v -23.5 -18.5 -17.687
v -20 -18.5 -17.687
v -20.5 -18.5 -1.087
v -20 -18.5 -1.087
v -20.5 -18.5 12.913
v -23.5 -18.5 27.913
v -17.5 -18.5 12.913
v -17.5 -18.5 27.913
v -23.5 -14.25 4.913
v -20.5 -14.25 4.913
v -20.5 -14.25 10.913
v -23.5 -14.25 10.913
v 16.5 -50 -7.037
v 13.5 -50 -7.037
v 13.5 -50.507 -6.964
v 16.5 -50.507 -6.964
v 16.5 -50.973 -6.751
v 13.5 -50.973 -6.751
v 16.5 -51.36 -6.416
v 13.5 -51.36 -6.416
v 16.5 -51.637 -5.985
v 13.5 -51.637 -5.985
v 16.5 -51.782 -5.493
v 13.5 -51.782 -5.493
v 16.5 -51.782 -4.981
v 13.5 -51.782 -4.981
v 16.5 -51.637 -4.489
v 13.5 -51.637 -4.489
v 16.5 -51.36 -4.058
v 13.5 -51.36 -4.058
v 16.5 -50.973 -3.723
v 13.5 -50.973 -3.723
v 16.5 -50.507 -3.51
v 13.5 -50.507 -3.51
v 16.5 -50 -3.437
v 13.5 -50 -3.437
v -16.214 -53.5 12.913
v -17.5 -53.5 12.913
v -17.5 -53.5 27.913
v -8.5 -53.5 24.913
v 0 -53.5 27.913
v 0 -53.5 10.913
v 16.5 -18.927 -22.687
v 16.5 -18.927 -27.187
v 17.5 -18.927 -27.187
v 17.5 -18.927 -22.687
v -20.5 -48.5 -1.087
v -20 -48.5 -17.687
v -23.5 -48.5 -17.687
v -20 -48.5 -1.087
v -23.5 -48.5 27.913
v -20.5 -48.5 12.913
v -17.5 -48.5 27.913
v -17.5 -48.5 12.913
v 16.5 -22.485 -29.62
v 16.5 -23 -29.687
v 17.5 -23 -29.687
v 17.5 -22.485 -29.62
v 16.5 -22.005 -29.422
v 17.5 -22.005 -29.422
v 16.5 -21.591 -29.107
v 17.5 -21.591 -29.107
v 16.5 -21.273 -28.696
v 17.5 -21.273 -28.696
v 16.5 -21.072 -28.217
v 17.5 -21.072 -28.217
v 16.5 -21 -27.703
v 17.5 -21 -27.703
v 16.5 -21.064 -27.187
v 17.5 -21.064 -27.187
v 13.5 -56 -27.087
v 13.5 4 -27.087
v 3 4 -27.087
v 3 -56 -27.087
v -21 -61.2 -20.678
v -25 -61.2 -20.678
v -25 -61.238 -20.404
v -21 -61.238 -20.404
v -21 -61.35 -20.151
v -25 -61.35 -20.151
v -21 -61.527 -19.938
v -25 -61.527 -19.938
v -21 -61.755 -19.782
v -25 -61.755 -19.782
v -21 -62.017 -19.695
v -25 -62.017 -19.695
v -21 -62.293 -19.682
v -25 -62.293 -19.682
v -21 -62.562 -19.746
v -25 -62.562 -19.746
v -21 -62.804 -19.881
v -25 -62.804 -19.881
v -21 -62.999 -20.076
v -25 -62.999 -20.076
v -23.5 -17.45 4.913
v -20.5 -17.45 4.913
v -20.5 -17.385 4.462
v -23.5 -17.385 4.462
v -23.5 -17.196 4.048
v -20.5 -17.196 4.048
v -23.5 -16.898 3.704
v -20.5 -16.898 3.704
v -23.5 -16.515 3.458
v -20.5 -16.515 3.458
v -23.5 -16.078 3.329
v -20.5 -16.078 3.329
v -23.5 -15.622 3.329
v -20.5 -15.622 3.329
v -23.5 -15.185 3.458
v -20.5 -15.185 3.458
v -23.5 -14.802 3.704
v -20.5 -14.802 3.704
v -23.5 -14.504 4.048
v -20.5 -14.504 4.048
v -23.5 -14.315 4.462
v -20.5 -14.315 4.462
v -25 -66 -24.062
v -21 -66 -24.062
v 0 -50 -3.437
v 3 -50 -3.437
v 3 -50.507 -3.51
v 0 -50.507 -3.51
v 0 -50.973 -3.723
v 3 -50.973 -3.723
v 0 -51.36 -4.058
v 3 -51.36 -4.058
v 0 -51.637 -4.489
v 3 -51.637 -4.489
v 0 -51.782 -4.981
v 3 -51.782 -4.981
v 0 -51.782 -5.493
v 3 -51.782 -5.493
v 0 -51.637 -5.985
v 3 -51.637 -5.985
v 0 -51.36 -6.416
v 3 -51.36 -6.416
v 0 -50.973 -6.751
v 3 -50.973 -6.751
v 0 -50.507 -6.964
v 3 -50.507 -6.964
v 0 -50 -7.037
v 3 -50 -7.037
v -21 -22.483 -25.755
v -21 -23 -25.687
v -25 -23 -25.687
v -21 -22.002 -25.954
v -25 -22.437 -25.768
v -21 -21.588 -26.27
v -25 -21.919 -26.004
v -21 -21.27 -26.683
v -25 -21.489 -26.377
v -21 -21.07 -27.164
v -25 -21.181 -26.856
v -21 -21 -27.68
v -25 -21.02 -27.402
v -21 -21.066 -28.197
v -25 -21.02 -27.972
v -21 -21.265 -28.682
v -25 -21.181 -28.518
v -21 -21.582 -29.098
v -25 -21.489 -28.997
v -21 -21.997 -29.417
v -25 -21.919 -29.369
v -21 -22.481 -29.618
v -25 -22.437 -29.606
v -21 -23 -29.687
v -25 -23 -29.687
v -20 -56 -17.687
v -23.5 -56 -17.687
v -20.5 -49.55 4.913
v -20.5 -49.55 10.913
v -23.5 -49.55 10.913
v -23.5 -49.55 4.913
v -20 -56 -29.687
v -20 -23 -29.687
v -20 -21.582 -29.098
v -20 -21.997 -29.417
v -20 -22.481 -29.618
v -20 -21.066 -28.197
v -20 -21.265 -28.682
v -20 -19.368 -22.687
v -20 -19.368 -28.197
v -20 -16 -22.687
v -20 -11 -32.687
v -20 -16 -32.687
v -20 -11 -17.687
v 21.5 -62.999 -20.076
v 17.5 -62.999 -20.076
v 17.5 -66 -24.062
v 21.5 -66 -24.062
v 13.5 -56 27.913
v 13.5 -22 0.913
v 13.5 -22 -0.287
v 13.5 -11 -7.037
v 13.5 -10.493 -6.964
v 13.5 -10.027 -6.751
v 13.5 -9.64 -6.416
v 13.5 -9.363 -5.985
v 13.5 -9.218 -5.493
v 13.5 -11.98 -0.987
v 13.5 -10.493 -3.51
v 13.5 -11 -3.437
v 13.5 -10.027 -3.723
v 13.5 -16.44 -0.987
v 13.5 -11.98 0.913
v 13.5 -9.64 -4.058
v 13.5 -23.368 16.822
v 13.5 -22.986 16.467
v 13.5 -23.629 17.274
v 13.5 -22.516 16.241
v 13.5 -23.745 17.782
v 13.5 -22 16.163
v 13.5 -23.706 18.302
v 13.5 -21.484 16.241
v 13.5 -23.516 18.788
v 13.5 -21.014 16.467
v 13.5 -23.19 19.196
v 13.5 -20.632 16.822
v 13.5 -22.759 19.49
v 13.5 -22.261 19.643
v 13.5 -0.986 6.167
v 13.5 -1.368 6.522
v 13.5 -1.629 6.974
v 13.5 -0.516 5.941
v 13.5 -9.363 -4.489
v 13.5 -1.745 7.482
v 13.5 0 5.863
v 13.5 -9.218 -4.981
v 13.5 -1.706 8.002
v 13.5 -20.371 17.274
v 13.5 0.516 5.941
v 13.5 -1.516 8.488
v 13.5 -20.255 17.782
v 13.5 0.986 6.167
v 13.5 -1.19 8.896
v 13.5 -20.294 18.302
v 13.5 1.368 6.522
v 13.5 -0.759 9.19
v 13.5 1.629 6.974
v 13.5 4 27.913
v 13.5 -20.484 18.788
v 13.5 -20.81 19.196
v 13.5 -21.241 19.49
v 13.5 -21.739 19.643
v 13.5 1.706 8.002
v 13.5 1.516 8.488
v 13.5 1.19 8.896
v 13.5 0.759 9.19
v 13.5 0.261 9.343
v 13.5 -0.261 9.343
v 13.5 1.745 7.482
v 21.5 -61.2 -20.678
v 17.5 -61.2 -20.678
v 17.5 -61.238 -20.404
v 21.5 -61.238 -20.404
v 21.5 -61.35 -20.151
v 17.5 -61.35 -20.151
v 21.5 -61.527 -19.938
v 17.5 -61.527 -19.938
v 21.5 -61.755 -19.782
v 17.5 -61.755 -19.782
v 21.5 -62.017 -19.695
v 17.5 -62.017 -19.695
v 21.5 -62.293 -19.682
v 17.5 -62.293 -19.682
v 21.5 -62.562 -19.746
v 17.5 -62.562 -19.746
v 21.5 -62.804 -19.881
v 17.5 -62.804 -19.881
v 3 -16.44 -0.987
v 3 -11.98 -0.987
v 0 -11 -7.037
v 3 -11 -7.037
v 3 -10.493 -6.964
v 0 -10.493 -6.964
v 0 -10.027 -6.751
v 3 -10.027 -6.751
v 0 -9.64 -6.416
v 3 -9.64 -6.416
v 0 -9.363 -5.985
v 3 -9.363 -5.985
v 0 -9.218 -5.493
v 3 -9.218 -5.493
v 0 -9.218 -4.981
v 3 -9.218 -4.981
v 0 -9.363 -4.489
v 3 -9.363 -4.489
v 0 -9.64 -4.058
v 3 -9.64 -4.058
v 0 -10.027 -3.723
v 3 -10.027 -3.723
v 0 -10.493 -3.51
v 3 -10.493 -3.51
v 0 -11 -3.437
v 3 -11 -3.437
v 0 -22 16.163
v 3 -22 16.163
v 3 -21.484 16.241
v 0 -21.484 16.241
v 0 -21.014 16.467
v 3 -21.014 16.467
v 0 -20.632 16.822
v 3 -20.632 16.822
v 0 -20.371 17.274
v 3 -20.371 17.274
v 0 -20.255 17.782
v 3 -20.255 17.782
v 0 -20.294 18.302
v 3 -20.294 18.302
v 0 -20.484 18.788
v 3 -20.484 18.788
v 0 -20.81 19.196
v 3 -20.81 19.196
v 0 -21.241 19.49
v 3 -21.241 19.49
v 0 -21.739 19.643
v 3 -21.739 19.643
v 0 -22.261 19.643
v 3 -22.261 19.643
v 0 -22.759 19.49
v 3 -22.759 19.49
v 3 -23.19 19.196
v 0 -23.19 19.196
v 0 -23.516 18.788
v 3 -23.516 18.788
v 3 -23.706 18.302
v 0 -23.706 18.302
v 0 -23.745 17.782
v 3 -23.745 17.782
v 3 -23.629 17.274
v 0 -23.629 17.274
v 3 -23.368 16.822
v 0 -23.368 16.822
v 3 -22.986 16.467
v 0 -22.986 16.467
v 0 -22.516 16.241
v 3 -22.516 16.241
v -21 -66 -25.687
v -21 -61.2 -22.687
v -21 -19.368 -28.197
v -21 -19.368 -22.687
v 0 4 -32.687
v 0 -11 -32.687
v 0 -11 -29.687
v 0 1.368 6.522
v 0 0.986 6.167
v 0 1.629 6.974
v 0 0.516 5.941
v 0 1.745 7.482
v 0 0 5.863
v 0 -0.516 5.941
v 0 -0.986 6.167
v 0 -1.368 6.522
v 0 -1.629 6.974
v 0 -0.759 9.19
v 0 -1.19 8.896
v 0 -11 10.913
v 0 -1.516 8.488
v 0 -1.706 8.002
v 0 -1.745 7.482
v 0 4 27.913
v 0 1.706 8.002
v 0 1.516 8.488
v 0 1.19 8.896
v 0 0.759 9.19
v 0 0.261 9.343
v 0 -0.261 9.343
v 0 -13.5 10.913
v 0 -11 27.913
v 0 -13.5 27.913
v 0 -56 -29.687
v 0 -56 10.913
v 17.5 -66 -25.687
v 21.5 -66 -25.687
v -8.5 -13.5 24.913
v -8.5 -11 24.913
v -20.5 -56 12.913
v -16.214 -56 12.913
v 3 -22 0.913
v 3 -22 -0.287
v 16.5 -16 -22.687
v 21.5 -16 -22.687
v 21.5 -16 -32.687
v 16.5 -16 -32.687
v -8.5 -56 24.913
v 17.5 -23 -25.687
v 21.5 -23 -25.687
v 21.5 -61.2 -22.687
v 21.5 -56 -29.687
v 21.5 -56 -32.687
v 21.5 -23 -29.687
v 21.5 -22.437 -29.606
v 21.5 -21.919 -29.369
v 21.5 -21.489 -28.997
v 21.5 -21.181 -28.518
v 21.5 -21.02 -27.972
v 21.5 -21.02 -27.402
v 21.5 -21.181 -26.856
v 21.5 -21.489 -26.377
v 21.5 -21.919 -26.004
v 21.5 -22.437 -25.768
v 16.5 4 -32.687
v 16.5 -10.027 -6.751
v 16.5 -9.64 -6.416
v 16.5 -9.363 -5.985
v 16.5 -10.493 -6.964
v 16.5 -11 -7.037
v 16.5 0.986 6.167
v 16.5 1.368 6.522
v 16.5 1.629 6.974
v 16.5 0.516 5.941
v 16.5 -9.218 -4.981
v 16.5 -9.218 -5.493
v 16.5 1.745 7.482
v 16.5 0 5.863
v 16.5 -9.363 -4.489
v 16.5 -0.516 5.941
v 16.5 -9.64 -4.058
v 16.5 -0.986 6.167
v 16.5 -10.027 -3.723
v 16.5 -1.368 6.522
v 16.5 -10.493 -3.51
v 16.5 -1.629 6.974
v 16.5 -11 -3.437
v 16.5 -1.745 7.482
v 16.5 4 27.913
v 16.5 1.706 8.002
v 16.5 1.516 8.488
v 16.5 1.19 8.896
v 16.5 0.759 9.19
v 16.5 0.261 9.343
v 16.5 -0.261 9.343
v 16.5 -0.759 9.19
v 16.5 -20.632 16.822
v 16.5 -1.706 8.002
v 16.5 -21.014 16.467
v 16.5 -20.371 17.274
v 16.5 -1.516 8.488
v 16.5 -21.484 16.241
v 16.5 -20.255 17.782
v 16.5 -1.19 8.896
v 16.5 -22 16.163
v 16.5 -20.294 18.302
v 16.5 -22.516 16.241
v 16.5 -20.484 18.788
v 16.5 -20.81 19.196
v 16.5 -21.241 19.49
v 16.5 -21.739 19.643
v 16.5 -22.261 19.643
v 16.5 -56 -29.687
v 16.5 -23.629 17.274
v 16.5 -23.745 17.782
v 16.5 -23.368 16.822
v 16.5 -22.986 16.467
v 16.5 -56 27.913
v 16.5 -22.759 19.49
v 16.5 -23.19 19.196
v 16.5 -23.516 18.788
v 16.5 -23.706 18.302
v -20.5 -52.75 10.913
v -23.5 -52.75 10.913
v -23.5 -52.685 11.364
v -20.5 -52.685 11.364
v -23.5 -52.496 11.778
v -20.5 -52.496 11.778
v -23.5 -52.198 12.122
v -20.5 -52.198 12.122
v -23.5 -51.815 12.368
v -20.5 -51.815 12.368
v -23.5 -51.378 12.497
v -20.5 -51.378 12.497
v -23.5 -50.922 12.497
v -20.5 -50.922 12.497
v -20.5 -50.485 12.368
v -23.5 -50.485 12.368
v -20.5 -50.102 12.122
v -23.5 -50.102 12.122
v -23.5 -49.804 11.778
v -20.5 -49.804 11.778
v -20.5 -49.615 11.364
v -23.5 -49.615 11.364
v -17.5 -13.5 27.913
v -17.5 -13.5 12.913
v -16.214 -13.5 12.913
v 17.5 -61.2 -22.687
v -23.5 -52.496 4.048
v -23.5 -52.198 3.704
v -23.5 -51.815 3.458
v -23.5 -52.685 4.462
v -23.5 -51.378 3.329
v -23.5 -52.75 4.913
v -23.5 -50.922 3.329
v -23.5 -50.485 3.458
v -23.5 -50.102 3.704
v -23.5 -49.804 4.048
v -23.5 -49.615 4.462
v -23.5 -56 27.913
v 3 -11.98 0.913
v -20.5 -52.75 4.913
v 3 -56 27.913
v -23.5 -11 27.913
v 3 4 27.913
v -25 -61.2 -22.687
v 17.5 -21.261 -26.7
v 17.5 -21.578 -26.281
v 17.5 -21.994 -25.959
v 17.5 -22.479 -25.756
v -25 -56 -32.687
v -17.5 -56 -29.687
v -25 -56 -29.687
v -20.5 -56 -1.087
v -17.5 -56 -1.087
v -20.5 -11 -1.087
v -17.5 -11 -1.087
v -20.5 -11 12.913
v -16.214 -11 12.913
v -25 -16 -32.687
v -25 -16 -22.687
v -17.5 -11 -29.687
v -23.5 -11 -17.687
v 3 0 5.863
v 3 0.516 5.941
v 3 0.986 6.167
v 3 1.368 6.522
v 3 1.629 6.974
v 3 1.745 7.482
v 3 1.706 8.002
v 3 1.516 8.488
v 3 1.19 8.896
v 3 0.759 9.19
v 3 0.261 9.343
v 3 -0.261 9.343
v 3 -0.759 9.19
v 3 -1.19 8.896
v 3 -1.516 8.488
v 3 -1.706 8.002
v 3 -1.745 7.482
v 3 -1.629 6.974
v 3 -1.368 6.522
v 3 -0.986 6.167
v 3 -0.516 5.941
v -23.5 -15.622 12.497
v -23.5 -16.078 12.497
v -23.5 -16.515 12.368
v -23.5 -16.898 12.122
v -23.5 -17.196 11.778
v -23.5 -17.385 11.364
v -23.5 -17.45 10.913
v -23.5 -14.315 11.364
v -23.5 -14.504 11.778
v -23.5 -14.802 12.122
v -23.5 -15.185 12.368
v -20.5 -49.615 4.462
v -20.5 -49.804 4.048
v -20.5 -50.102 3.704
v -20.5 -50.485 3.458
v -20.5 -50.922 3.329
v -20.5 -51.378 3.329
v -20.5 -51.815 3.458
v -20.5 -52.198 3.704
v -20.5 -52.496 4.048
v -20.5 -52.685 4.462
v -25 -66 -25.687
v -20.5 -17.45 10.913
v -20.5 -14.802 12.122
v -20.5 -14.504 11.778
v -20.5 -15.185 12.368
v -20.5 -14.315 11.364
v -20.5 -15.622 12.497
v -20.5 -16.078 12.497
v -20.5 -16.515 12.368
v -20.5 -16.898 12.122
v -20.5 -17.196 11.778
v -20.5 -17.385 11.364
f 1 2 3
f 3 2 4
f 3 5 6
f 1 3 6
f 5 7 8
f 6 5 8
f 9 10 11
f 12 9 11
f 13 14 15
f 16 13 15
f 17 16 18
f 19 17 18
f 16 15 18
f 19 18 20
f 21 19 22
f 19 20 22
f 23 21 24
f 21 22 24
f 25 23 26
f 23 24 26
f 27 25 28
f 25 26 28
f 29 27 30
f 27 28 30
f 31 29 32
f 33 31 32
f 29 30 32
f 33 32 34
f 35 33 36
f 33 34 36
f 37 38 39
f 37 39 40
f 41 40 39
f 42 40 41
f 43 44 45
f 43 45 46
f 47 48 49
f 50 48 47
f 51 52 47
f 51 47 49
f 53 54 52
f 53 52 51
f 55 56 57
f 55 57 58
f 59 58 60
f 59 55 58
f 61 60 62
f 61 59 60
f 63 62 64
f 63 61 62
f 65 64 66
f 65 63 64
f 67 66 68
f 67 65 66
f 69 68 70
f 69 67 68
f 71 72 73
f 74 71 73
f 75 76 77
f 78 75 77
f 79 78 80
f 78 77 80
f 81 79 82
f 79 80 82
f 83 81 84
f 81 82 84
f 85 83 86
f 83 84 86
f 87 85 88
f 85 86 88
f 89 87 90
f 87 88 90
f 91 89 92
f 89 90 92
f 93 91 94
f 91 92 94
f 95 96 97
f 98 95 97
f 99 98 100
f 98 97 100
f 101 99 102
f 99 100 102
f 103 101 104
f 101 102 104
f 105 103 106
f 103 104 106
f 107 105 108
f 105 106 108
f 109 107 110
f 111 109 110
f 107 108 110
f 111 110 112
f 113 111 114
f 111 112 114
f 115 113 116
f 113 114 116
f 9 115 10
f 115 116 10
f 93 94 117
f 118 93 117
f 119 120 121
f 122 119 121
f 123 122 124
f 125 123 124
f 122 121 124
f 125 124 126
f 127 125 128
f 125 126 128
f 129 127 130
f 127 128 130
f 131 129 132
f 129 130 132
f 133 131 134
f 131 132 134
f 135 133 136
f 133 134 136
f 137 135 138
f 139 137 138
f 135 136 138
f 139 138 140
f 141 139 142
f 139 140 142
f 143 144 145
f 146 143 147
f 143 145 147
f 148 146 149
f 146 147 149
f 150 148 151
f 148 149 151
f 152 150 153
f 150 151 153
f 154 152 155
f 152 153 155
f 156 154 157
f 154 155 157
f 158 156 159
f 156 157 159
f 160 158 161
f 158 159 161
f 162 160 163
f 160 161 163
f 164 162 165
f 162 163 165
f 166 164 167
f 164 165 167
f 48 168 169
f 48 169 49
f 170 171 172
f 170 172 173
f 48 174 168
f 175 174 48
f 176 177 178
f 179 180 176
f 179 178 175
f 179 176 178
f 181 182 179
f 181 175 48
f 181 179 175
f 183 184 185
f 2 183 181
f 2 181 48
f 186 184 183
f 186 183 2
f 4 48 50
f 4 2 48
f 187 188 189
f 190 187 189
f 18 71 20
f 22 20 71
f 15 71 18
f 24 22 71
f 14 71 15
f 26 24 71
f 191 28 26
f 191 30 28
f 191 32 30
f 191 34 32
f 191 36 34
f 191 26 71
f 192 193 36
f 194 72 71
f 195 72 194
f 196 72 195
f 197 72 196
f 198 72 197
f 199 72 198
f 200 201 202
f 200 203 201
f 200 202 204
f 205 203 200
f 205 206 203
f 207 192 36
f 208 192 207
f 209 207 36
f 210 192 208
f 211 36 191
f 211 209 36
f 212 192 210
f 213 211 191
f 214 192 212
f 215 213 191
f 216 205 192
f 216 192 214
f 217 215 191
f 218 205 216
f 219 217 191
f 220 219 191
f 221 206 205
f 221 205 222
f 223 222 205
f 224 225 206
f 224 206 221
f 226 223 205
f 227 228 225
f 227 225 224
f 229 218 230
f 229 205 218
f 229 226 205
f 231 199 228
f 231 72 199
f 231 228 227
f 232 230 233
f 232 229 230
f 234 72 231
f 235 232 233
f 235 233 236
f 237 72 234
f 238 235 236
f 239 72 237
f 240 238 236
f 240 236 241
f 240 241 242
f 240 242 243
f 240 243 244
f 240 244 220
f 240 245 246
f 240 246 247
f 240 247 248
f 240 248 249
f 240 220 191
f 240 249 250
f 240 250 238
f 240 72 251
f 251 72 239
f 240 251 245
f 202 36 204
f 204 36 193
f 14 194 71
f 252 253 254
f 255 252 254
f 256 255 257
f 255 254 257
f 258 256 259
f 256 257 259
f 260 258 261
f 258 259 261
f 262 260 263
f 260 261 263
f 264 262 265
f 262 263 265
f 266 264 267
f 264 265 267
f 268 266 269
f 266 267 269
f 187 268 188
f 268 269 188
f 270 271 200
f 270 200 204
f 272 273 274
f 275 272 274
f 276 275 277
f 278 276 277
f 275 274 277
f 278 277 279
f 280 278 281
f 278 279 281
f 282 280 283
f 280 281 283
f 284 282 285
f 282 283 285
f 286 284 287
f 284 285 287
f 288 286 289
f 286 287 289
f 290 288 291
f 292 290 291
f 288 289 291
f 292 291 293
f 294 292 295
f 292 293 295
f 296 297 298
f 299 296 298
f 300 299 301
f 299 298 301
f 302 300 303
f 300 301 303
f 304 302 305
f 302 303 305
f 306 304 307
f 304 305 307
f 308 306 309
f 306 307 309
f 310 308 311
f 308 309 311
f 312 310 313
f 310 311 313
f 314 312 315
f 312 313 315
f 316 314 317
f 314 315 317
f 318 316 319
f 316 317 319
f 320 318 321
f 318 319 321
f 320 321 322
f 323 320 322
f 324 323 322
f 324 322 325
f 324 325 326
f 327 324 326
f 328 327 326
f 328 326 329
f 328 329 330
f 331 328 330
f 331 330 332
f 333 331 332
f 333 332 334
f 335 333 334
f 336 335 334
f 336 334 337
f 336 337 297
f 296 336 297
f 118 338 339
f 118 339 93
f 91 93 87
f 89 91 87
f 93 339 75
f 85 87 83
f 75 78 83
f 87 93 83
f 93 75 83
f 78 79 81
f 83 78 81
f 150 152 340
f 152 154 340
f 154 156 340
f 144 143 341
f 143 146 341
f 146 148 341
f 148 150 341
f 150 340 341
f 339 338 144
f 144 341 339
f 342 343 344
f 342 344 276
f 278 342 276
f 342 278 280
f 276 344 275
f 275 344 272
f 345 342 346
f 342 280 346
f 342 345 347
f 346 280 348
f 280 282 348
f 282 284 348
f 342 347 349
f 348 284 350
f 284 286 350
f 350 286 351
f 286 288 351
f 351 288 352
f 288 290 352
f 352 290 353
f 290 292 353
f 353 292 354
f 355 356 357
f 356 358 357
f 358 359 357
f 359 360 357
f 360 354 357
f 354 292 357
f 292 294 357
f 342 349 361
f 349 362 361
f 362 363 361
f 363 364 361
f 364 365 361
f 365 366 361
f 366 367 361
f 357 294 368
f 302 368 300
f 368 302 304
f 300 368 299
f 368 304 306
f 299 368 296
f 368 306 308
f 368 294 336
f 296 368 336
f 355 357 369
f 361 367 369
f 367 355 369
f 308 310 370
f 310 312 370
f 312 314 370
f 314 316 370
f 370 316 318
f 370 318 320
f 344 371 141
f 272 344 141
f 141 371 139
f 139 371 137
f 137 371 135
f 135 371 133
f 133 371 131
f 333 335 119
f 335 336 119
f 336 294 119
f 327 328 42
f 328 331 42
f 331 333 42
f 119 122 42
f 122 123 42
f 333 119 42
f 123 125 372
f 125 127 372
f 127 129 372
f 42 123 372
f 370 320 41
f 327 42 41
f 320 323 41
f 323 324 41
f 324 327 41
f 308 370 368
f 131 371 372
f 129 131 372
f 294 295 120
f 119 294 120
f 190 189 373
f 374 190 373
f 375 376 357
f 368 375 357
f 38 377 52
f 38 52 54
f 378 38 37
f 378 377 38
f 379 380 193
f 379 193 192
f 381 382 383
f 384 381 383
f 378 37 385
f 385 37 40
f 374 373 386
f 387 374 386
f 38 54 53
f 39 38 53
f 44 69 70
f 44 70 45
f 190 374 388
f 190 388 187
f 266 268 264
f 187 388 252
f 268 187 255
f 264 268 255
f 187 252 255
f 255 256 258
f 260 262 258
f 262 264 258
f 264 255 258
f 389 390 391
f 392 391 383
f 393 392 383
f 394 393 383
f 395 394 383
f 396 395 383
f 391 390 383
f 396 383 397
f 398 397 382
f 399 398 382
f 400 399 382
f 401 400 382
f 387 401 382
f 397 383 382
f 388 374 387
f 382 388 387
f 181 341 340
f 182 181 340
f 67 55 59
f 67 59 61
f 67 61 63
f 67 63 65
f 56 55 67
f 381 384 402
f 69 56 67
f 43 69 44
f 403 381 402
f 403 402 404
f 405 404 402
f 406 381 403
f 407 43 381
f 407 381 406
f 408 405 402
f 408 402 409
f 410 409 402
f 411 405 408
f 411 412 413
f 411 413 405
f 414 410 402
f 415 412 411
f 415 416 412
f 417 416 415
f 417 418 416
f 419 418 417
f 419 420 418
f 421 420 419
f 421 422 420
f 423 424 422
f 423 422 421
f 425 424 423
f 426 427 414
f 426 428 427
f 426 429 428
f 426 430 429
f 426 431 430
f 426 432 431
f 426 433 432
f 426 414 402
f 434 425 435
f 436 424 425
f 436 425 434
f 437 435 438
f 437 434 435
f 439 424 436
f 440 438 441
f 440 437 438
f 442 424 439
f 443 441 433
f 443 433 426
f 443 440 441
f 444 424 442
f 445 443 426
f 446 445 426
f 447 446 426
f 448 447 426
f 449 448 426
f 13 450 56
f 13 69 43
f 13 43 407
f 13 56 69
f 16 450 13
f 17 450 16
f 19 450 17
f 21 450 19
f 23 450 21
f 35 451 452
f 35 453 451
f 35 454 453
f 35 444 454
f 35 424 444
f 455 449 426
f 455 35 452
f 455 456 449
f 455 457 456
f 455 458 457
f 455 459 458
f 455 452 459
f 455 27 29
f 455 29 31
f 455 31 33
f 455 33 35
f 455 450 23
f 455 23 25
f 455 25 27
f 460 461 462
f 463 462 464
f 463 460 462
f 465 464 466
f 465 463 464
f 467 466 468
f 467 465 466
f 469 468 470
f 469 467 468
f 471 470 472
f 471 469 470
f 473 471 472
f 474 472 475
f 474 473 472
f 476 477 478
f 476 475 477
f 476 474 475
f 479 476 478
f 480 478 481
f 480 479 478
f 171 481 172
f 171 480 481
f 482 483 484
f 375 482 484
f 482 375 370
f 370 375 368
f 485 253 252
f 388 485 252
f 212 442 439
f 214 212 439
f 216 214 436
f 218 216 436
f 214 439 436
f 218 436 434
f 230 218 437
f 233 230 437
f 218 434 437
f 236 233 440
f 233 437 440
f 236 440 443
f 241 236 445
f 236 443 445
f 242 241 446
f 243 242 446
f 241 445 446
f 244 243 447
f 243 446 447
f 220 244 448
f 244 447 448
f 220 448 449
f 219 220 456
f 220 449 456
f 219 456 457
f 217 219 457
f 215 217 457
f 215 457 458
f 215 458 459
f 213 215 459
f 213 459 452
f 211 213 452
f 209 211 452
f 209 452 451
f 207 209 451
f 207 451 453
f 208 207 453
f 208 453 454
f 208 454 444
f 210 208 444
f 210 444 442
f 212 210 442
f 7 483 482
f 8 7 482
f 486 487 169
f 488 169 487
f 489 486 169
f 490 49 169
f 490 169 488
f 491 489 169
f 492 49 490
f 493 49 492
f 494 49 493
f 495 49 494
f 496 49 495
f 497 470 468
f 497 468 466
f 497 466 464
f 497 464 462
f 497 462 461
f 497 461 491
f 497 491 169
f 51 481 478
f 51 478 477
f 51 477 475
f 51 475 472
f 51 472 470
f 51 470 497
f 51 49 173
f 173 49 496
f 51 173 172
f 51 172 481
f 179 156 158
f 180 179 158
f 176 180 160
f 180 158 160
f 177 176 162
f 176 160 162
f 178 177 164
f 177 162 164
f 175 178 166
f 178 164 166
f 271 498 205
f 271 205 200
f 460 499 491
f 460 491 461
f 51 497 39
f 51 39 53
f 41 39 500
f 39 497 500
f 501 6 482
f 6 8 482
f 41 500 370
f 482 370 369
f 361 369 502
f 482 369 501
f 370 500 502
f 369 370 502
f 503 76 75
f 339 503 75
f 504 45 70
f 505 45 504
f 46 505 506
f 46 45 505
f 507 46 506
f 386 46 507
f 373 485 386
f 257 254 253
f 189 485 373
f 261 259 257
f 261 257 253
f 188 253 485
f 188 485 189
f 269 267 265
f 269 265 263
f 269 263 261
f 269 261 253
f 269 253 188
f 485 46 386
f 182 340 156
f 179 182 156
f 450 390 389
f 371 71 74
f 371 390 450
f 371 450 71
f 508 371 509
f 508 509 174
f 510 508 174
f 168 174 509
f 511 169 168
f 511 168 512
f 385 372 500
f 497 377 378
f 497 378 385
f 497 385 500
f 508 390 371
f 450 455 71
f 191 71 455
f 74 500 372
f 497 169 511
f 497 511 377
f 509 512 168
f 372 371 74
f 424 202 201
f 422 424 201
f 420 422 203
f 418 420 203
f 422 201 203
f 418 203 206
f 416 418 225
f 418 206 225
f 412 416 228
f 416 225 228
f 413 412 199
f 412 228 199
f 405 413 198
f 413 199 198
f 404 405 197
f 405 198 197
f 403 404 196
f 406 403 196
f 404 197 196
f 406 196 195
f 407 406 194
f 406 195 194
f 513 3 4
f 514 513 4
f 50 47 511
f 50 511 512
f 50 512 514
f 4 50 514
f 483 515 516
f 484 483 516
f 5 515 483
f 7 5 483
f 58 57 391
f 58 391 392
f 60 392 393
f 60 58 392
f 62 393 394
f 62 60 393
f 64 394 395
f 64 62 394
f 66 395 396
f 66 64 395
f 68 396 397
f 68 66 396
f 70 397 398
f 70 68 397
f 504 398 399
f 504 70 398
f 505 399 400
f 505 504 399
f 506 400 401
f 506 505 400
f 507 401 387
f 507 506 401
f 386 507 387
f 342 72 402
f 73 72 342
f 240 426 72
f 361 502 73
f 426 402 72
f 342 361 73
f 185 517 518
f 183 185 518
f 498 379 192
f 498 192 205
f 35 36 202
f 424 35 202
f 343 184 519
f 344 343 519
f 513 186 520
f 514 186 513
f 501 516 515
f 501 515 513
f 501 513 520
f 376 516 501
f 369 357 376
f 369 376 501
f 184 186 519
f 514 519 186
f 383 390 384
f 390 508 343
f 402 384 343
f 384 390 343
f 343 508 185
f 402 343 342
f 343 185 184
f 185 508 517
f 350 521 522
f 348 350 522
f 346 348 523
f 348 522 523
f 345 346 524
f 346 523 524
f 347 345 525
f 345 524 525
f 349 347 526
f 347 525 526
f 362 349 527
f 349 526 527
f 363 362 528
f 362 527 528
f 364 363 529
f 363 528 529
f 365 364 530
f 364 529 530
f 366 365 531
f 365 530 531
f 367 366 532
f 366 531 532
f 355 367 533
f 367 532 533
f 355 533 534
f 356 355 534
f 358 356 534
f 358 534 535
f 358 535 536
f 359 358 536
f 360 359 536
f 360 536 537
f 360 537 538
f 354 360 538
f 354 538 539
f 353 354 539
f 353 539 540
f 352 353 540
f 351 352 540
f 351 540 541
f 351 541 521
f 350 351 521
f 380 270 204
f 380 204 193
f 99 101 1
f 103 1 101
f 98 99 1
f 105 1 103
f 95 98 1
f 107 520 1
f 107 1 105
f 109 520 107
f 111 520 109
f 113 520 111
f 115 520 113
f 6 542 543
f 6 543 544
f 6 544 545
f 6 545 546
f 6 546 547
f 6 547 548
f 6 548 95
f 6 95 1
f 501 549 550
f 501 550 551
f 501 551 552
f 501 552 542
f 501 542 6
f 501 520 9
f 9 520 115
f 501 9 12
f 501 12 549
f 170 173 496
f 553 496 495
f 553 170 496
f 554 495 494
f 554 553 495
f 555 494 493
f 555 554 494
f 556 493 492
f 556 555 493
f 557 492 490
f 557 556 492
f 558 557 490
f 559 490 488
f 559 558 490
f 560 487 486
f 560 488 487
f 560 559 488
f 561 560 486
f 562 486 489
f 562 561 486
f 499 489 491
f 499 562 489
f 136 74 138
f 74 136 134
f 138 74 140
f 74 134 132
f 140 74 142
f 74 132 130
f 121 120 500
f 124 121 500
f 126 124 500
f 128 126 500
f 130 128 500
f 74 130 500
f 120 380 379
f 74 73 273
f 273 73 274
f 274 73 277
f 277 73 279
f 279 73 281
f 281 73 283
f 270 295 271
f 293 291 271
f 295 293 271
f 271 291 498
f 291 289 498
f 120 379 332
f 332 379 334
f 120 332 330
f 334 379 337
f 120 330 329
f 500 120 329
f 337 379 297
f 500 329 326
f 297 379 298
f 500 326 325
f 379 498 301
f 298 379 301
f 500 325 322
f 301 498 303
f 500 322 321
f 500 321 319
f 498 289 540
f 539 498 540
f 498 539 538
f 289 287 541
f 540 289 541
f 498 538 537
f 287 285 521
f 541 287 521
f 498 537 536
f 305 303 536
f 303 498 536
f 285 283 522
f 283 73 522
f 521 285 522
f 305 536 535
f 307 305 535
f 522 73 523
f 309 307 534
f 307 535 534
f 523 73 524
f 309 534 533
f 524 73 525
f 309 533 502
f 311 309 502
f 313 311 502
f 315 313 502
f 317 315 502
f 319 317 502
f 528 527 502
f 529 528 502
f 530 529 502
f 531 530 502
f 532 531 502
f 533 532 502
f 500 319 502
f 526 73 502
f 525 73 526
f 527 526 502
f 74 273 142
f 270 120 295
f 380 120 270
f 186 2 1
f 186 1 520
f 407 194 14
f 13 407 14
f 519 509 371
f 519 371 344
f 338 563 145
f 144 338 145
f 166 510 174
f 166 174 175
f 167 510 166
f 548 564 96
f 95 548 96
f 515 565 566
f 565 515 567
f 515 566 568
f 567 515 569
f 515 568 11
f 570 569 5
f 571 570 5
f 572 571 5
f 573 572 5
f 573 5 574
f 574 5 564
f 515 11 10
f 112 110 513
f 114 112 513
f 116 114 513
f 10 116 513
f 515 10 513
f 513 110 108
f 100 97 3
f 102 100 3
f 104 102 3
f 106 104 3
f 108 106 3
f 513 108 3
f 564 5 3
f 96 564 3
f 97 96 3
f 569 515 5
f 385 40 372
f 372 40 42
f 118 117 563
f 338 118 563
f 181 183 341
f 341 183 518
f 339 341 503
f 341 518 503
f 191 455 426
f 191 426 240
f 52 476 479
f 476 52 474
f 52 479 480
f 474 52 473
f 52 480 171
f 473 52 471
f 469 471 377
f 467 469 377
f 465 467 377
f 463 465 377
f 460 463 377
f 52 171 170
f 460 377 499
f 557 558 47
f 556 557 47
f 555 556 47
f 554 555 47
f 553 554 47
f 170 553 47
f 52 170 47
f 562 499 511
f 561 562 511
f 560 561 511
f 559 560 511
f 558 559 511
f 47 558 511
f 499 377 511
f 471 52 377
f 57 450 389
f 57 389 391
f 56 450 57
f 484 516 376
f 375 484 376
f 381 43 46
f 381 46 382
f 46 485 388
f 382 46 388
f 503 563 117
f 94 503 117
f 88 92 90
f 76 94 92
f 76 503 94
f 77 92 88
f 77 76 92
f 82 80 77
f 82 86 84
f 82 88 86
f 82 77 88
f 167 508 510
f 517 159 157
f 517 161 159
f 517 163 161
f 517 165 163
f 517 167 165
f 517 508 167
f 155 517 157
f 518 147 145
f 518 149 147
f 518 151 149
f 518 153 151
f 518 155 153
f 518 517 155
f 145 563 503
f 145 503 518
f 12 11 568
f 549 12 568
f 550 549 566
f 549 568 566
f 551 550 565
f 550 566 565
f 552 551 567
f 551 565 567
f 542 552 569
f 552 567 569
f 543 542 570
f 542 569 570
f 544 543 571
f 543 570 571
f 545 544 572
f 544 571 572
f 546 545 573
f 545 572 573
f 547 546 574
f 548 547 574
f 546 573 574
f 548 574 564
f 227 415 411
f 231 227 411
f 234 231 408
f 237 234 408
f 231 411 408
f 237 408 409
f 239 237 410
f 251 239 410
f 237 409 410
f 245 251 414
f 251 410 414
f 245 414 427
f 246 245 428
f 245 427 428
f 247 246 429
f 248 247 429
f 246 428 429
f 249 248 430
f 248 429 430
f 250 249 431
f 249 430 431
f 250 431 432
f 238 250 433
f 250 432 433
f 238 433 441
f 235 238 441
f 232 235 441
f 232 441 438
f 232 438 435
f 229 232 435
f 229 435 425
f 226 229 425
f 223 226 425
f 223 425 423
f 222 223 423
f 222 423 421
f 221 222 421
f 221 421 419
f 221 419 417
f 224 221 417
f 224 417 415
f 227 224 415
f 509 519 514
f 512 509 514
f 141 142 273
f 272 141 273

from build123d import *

# Parameters (mm, degrees)
CUT_EXTRUDE1_START             = -55
CUT_EXTRUDE1_DEPTH             = 50.2
CUT_EXTRUDE1_2_DEPTH           = 39
CUT_EXTRUDE1_START_2           = -16
CUT_EXTRUDE1_3_OUTLINE_W       = 21.5
CUT_EXTRUDE1_3_OUTLINE_H       = 4
CUT_EXTRUDE1_3_OUTLINE_W_2     = 7.5
CUT_EXTRUDE1_3_DEPTH           = 6
CUT_EXTRUDE1_START_3           = -10
CUT_EXTRUDE1_4_OUTLINE_W       = 17.5
CUT_EXTRUDE1_4_OUTLINE_H       = 3
CUT_EXTRUDE1_4_DEPTH           = 6.998889459
CUT_EXTRUDE1_START_4           = -32.686984715
CUT_EXTRUDE1_5_DEPTH           = 2.5
CUT_EXTRUDE1_START_5           = -25
CUT_EXTRUDE1_6_DEPTH           = 46.5
CUT_EXTRUDE2_DEPTH             = 5.2
CUT_EXTRUDE3_DEPTH             = 40
CUT_EXTRUDE4_DEPTH             = 38.5
CUT_EXTRUDE5_DEPTH             = 4
CUT_EXTRUDE6_DEPTH             = 4
CUT_EXTRUDE7_DEPTH             = 4
CUT_EXTRUDE8_START             = -4
CUT_EXTRUDE8_DEPTH             = 4
CUT_EXTRUDE9_START             = -1
CUT_EXTRUDE9_DEPTH             = 1
CUT_EXTRUDE10_DEPTH            = 1
SKETCH11_W                     = 16.5
SKETCH11_H                     = 60.6
BOSS_EXTRUDE1_DEPTH            = 15
SKETCH12_W                     = 29
SKETCH12_H                     = 30
CUT_EXTRUDE11_DEPTH            = 84.339300358
SKETCH13_W                     = 10.5
SKETCH13_H                     = 55
CUT_EXTRUDE12_DEPTH            = 82.199993727
CUT_EXTRUDE15_DEPTH            = 84.106491828
CUT_EXTRUDE16_REACH            = 80.794
BOSS_EXTRUDE2_DEPTH            = 10.5
F_3_5_3_5_DIAMETER_HOLE1_D     = 3.5
F_3_5_3_5_DIAMETER_HOLE1_DEPTH = 3
F_3_5_3_5_DIAMETER_HOLE2_D     = 3.5
F_3_5_3_5_DIAMETER_HOLE2_DEPTH = 8
SKETCH24_W                     = 46.5
SKETCH24_H                     = 16
CUT_EXTRUDE17_DEPTH            = 3
SKETCH25_W                     = 3
SKETCH25_H                     = 6
BOSS_EXTRUDE4_DEPTH            = 46.5
SKETCH27_W                     = 45.6
SKETCH27_H                     = 7.5
BOSS_EXTRUDE5_DEPTH            = 3.5
CUT_EXTRUDE18_START            = -45
SKETCH28_W                     = 4.285714286
SKETCH28_H                     = 14
CUT_EXTRUDE18_DEPTH            = 45


with BuildPart() as part:
    # Cut-Extrude1: read off the stored shape, not the designer's step
    # Cut-Extrude1 outline → Cut-Extrude1 (new body)
    with BuildSketch(Plane.XZ.offset(66).offset(CUT_EXTRUDE1_START)):
        Polygon((0, 10.913015285), (0, -25.686984715), (21.5, -25.686984715), (21.5, 27.913015285), (-25, 27.913015285), (-25, -25.686984715), (-17.5, -25.686984715), (-17.5, 10.913015285), (-8.5, 24.913015285), align=None)
    extrude(amount=CUT_EXTRUDE1_DEPTH)

    # Cut-Extrude1 2 outline → Cut-Extrude1 2 (add)
    with BuildSketch(Plane.XZ.offset(66).offset(CUT_EXTRUDE1_START)):
        Polygon((21.5, -25.686984715), (0, -25.686984715), (0, -29.686984715), (-17.5, -29.686984715), (-17.5, -25.686984715), (-25, -25.686984715), (-25, -32.686984715), (21.5, -32.686984715), align=None)
    extrude(amount=CUT_EXTRUDE1_2_DEPTH)

    # Cut-Extrude1 3 outline → Cut-Extrude1 3 (add)
    with BuildSketch(Plane.XZ.offset(66).offset(CUT_EXTRUDE1_START_2)):
        with Locations((10.75, -27.686984715)):
            Rectangle(CUT_EXTRUDE1_3_OUTLINE_W, CUT_EXTRUDE1_3_OUTLINE_H)
        with Locations((-21.25, -27.686984715)):
            Rectangle(CUT_EXTRUDE1_3_OUTLINE_W_2, CUT_EXTRUDE1_3_OUTLINE_H)
    extrude(amount=CUT_EXTRUDE1_3_DEPTH)

    # Cut-Extrude1 4 outline → Cut-Extrude1 4 (add)
    with BuildSketch(Plane.XZ.offset(66).offset(CUT_EXTRUDE1_START_3)):
        with Locations((-8.75, -24.186984715)):
            Rectangle(CUT_EXTRUDE1_4_OUTLINE_W, CUT_EXTRUDE1_4_OUTLINE_H)
    extrude(amount=CUT_EXTRUDE1_4_DEPTH)

    # Cut-Extrude1 5 outline → Cut-Extrude1 5 (add)
    with BuildSketch(Plane.XY.offset(CUT_EXTRUDE1_START_4)):
        with BuildLine():
            Line((21.5, -50), (20, -50))
            add(Edge.make_bspline(
                [(20, -50), (20, -56.474665919), (-1.75, -56.474665919), (-23.5, -56.474665919), (-23.5, -50)],
                knots=[3.141592654, 3.141592654, 3.141592654, 4.71238898, 4.71238898, 6.283185307, 6.283185307, 6.283185307], degree=2, weights=[1, 0.707106781, 1, 0.707106781, 1]))
            Line((-23.5, -50), (-25, -50))
            add(Edge.make_bspline(
                [(21.5, -50), (21.5, -50.09468229), (21.492127929, -50.284046871), (21.445455232, -50.658803427), (21.331279759, -51.114385581), (21.116585857, -51.62790352), (20.837225059, -52.104092778), (20.503510106, -52.544605667), (19.994946462, -53.090128019), (19.250040532, -53.706208194), (18.455849001, -54.204954404), (17.874413136, -54.519485832), (17.472964493, -54.724490985), (16.947888344, -54.97109157), (16.28060453, -55.252861877), (15.342350204, -55.610435464), (14.08020873, -56.024524848), (12.704647903, -56.395626222), (11.540151261, -56.666305963), (10.635775953, -56.85602278), (9.857415835, -57.002816928), (9.220023976, -57.113406891), (8.575249929, -57.219018373), (7.756242667, -57.341650868), (6.420129281, -57.517794074), (4.706083352, -57.700164474), (2.944949539, -57.831502083), (1.514762167, -57.90548411), (0.433251397, -57.945296373), (-0.473981522, -57.965298566), (-1.2023611, -57.973324155), (-1.75, -57.975336801), (-2.2976389, -57.973324155), (-3.026018478, -57.965298566), (-3.933251397, -57.945296373), (-5.014762167, -57.90548411), (-6.444949539, -57.831502083), (-8.206083352, -57.700164474), (-9.920129281, -57.517794074), (-11.256242667, -57.341650868), (-12.075249929, -57.219018373), (-12.720023976, -57.113406891), (-13.357415835, -57.002816928), (-14.135775953, -56.85602278), (-15.040151261, -56.666305963), (-16.204647903, -56.395626222), (-17.58020873, -56.024524848), (-18.842350204, -55.610435464), (-19.78060453, -55.252861877), (-20.447888344, -54.97109157), (-20.972964493, -54.724490985), (-21.374413136, -54.519485832), (-21.955849001, -54.204954404), (-22.750040532, -53.706208194), (-23.494946462, -53.090128019), (-24.003510106, -52.544605667), (-24.337225059, -52.104092778), (-24.616585857, -51.62790352), (-24.831279759, -51.114385581), (-24.945455232, -50.658803427), (-24.992127929, -50.284046871), (-25, -50.09468229), (-25, -50)],
                knots=[0.5, 0.5, 0.5, 0.5, 0.50390625, 0.5078125, 0.515625, 0.5234375, 0.53125, 0.5390625, 0.546875, 0.5625, 0.578125, 0.58203125, 0.5859375, 0.59375, 0.6015625, 0.609375, 0.625, 0.640625, 0.6484375, 0.65625, 0.6640625, 0.66796875, 0.671875, 0.6796875, 0.6875, 0.703125, 0.71875, 0.7265625, 0.734375, 0.7421875, 0.74609375, 0.75, 0.75390625, 0.7578125, 0.765625, 0.7734375, 0.78125, 0.796875, 0.8125, 0.8203125, 0.828125, 0.83203125, 0.8359375, 0.84375, 0.8515625, 0.859375, 0.875, 0.890625, 0.8984375, 0.90625, 0.9140625, 0.91796875, 0.921875, 0.9375, 0.953125, 0.9609375, 0.96875, 0.9765625, 0.984375, 0.9921875, 0.99609375, 1, 1, 1, 1], degree=3))
        make_face()
    extrude(amount=CUT_EXTRUDE1_5_DEPTH)

    # Cut-Extrude1 6 outline → Cut-Extrude1 6 (add)
    with BuildSketch(Plane.YZ.offset(CUT_EXTRUDE1_START_5)):
        with BuildLine():
            ThreePointArc((-61.2, -20.677767147), (-61.882895489, -19.729376547), (-62.998889459, -20.076289273))
            Line((-62.998889459, -20.076289273), (-66, -24.062396958))
            Line((-66, -24.062396958), (-66, -25.686984715))
            Line((-66, -25.686984715), (-61.2, -25.686984715))
            Line((-61.2, -25.686984715), (-61.2, -20.677767147))
        make_face()
    extrude(amount=CUT_EXTRUDE1_6_DEPTH)

    # Sketch2 → Cut-Extrude2 (cut)
    with BuildSketch(Plane.XZ.offset(61.2)):
        Polygon((-25, -22.686984715), (-17.5, -22.686984715), (-17.5, 10.913015285), (-8.5, 24.913015285), (0, 10.913015285), (0, -22.686984715), (21.5, -22.686984715), (21.5, 27.913015285), (-25, 27.913015285), align=None)
    extrude(amount=-CUT_EXTRUDE2_DEPTH, mode=Mode.SUBTRACT)

    # Sketch3 → Cut-Extrude3 (cut)
    with BuildSketch(Plane(origin=(0, -13.5, 0), x_dir=(1, 0, 0), z_dir=(0, 1, 0))):
        Polygon((-8.5, -24.913015285), (-17.5, -10.913015285), (-17.5, -27.913015285), (0, -27.913015285), (0, -10.913015285), align=None)
    extrude(amount=-CUT_EXTRUDE3_DEPTH, mode=Mode.SUBTRACT)

    # Sketch4 → Cut-Extrude4 (cut)
    with BuildSketch(Plane(origin=(-21, 0, 0), x_dir=(0, -1, 0), z_dir=(-1, 0, 0))):
        with BuildLine():
            Line((56, -22.686984715), (56, -25.686984715))
            Line((56, -25.686984715), (66, -25.686984715))
            Line((66, -25.686984715), (66, -24.062396958))
            Line((66, -24.062396958), (62.998889459, -20.076289273))
            ThreePointArc((62.998889459, -20.076289273), (61.882895489, -19.729376547), (61.2, -20.677767147))
            Line((61.2, -20.677767147), (61.2, -22.686984715))
            Line((61.2, -22.686984715), (56, -22.686984715))
        make_face()
    extrude(amount=-CUT_EXTRUDE4_DEPTH, mode=Mode.SUBTRACT)

    # Sketch5 → Cut-Extrude5 (cut)
    with BuildSketch(Plane.ZY.offset(25)):
        Polygon((-22.686984715, -16), (-22.686984715, -56), (27.913015285, -56), (27.913015285, -11), (-32.686984715, -11), (-32.686984715, -16), align=None)
    extrude(amount=-CUT_EXTRUDE5_DEPTH, mode=Mode.SUBTRACT)

    # Sketch6 → Cut-Extrude6 (cut)
    with BuildSketch(Plane.ZY.offset(25)):
        with BuildLine():
            Line((-29.686984715, -23), (-29.686984715, -50))
            Line((-29.686984715, -50), (-29.686984715, -56))
            Line((-29.686984715, -56), (-25.686984715, -56))
            Line((-25.686984715, -56), (-25.686984715, -23))
            ThreePointArc((-25.686984715, -23), (-27.686984715, -21), (-29.686984715, -23))
        make_face()
    extrude(amount=-CUT_EXTRUDE6_DEPTH, mode=Mode.SUBTRACT)

    # Sketch7 → Cut-Extrude7 (cut)
    with BuildSketch(Plane(origin=(21.5, 0, 0), x_dir=(0, 0, -1), z_dir=(1, 0, 0))):
        Polygon((-27.913015285, -56), (22.686984715, -56), (22.686984715, -16), (32.686984715, -16), (32.686984715, -11), (-27.913015285, -11), align=None)
    extrude(amount=-CUT_EXTRUDE7_DEPTH, mode=Mode.SUBTRACT)

    # Sketch8 → Cut-Extrude8 (cut)
    with BuildSketch(Plane(origin=(21.5, 0, 0), x_dir=(0, 0, -1), z_dir=(1, 0, 0)).offset(CUT_EXTRUDE8_START)):
        with BuildLine():
            Line((25.686984715, -23), (25.686984715, -56))
            Line((25.686984715, -56), (29.686984715, -56))
            Line((29.686984715, -56), (29.686984715, -50))
            Line((29.686984715, -50), (29.686984715, -23))
            ThreePointArc((29.686984715, -23), (27.686984715, -21), (25.686984715, -23))
        make_face()
    extrude(amount=CUT_EXTRUDE8_DEPTH, mode=Mode.SUBTRACT)

    # Sketch9 → Cut-Extrude9 (cut)
    with BuildSketch(Plane(origin=(17.5, 0, 0), x_dir=(0, 0, -1), z_dir=(1, 0, 0)).offset(CUT_EXTRUDE9_START)):
        with BuildLine():
            Line((32.686984715, -16), (32.686984715, -11))
            Line((32.686984715, -11), (-27.913015285, -11))
            Line((-27.913015285, -11), (-27.913015285, -56))
            Line((-27.913015285, -56), (29.686984715, -56))
            Line((29.686984715, -56), (29.686984715, -50))
            Line((29.686984715, -50), (29.686984715, -23))
            ThreePointArc((29.686984715, -23), (28.911729586, -21.41886117), (27.186984715, -21.063508327))
            Line((27.186984715, -21.063508327), (27.186984715, -18.926625782))
            Line((27.186984715, -18.926625782), (22.686984715, -18.926625782))
            Line((22.686984715, -18.926625782), (22.686984715, -16))
            Line((22.686984715, -16), (32.686984715, -16))
        make_face()
    extrude(amount=CUT_EXTRUDE9_DEPTH, mode=Mode.SUBTRACT)

    # Sketch10 → Cut-Extrude10 (cut)
    with BuildSketch(Plane.ZY.offset(21)):
        with BuildLine():
            Line((27.913015285, -56), (27.913015285, -11))
            Line((27.913015285, -11), (-32.686984715, -11))
            Line((-32.686984715, -11), (-32.686984715, -16))
            Line((-32.686984715, -16), (-22.686984715, -16))
            Line((-22.686984715, -16), (-22.686984715, -19.368227571))
            Line((-22.686984715, -19.368227571), (-28.196984715, -19.368227571))
            Line((-28.196984715, -19.368227571), (-28.196984715, -21.066117894))
            ThreePointArc((-28.196984715, -21.066117894), (-29.271282666, -21.779344438), (-29.686984715, -23))
            Line((-29.686984715, -23), (-29.686984715, -50))
            Line((-29.686984715, -50), (-29.686984715, -56))
            Line((-29.686984715, -56), (27.913015285, -56))
        make_face()
    extrude(amount=-CUT_EXTRUDE10_DEPTH, mode=Mode.SUBTRACT)

    # Sketch11 → Boss-Extrude1 (add)
    with BuildSketch(Plane(origin=(0, -11, 0), x_dir=(-1, 0, 0), z_dir=(0, 1, 0))):
        with Locations((-8.25, -2.386984715)):
            Rectangle(SKETCH11_W, SKETCH11_H)
    extrude(amount=BOSS_EXTRUDE1_DEPTH)

    # Sketch12 → Cut-Extrude11 (cut, through all)
    with BuildSketch(Plane(origin=(-17.5, 0, 0), x_dir=(0, 0, -1), z_dir=(1, 0, 0))):
        with Locations((-13.413015285, -33.5)):
            Rectangle(SKETCH12_W, SKETCH12_H)
        with BuildLine():
            Line((-10.913015285, -14.25), (-4.913015285, -14.25))
            ThreePointArc((-4.913015285, -14.25), (-3.313015285, -15.85), (-4.913015285, -17.45))
            Line((-4.913015285, -17.45), (-10.913015285, -17.45))
            ThreePointArc((-10.913015285, -17.45), (-12.513015285, -15.85), (-10.913015285, -14.25))
        make_face()
        with BuildLine():
            Line((-10.913015285, -49.55), (-4.913015285, -49.55))
            ThreePointArc((-4.913015285, -49.55), (-3.313015285, -51.15), (-4.913015285, -52.75))
            Line((-4.913015285, -52.75), (-10.913015285, -52.75))
            ThreePointArc((-10.913015285, -52.75), (-12.513015285, -51.15), (-10.913015285, -49.55))
        make_face()
    extrude(amount=-CUT_EXTRUDE11_DEPTH, mode=Mode.SUBTRACT)

    # Sketch13 → Cut-Extrude12 (cut, through all)
    with BuildSketch(Plane(origin=(0, 4, 0), x_dir=(-1, 0, 0), z_dir=(0, 1, 0))):
        with Locations((-8.25, 0.413015285)):
            Rectangle(SKETCH13_W, SKETCH13_H)
    extrude(amount=-CUT_EXTRUDE12_DEPTH, mode=Mode.SUBTRACT)

    # Sketch16 → Cut-Extrude15 (cut, through all)
    with BuildSketch(Plane.ZY.offset(-13.5)):
        with BuildLine():
            Line((-3.436984715, -50), (-3.436984715, -11))
            ThreePointArc((-3.436984715, -11), (-5.236984715, -9.2), (-7.036984715, -11))
            Line((-7.036984715, -11), (-7.036984715, -50))
            ThreePointArc((-7.036984715, -50), (-5.236984715, -51.8), (-3.436984715, -50))
        make_face()
    extrude(amount=-CUT_EXTRUDE15_DEPTH, mode=Mode.SUBTRACT)

    # Sketch17 → Cut-Extrude16 (cut, up to next)
    with BuildSketch(Plane(origin=(3, 0, 0), x_dir=(0, 0, -1), z_dir=(1, 0, 0)), mode=Mode.PRIVATE) as cut_extrude16_sk1:
        with BuildLine():
            Line((7.036984715, -50), (7.036984715, -11))
            ThreePointArc((7.036984715, -11), (5.236984715, -9.2), (3.436984715, -11))
            Line((3.436984715, -11), (3.436984715, -50))
            ThreePointArc((3.436984715, -50), (5.236984715, -51.8), (7.036984715, -50))
        make_face()
    cut_extrude16_tool1 = extrude(cut_extrude16_sk1.sketch, amount=-CUT_EXTRUDE16_REACH, mode=Mode.PRIVATE) & part.part
    add(cut_extrude16_tool1.solids().sort_by_distance((3, -30.5, -5.236985))[0], mode=Mode.SUBTRACT)

    # Sketch18 → Boss-Extrude2 (add)
    with BuildSketch(Plane(origin=(3, 0, 0), x_dir=(0, 0, -1), z_dir=(1, 0, 0))):
        Polygon((-0.913015285, -22), (-0.913015285, -11.980442449), (0.986984715, -11.980442449), (0.986984715, -16.440355157), (0.286984715, -22), align=None)
    extrude(amount=BOSS_EXTRUDE2_DEPTH)

    # Ø3.5 (3.5) Diameter Hole1
    with Locations(Plane.ZY):
        with Locations((7.613015285, 0), (17.913015285, -22)):
            Hole(F_3_5_3_5_DIAMETER_HOLE1_D / 2, depth=F_3_5_3_5_DIAMETER_HOLE1_DEPTH)

    # Ø3.5 (3.5) Diameter Hole2
    with Locations(Plane.ZY.offset(-13.5)):
        with Locations((7.613015285, 0), (17.913015285, -22)):
            Hole(F_3_5_3_5_DIAMETER_HOLE2_D / 2, depth=F_3_5_3_5_DIAMETER_HOLE2_DEPTH)

    # Sketch24 → Cut-Extrude17 (cut)
    with BuildSketch(Plane(origin=(0, 0, -32.686984715), x_dir=(-1, 0, 0), z_dir=(0, 0, -1))):
        with Locations((1.75, -58)):
            Rectangle(SKETCH24_W, SKETCH24_H)
    extrude(amount=-CUT_EXTRUDE17_DEPTH, mode=Mode.SUBTRACT)

    # Sketch25 → Boss-Extrude4 (add)
    with BuildSketch(Plane.ZY.offset(25)):
        with Locations((-31.186984715, -53)):
            Rectangle(SKETCH25_W, SKETCH25_H)
    extrude(amount=-BOSS_EXTRUDE4_DEPTH)

    # Sketch27 → Boss-Extrude5 (add)
    # profile 1 of 2: a face of its own
    with BuildSketch(Plane.ZY.offset(20)):
        with Locations((5.113015285, -14.75)):
            Rectangle(SKETCH27_W, SKETCH27_H)
        with BuildLine():
            Line((10.913015285, -17.45), (4.913015285, -17.45))
            ThreePointArc((4.913015285, -17.45), (3.313015285, -15.85), (4.913015285, -14.25))
            Line((4.913015285, -14.25), (10.913015285, -14.25))
            ThreePointArc((10.913015285, -14.25), (12.513015285, -15.85), (10.913015285, -17.45))
        make_face(mode=Mode.SUBTRACT)
    # profile 2 of 2: a face of its own
    with BuildSketch(Plane.ZY.offset(20)):
        with Locations((5.113015285, -52.25)):
            Rectangle(SKETCH27_W, SKETCH27_H)
        with BuildLine():
            Line((10.913015285, -52.75), (4.913015285, -52.75))
            ThreePointArc((4.913015285, -52.75), (3.313015285, -51.15), (4.913015285, -49.55))
            Line((4.913015285, -49.55), (10.913015285, -49.55))
            ThreePointArc((10.913015285, -49.55), (12.513015285, -51.15), (10.913015285, -52.75))
        make_face(mode=Mode.SUBTRACT)
    extrude(amount=BOSS_EXTRUDE5_DEPTH)

    # Sketch28 → Cut-Extrude18 (cut)
    with BuildSketch(Plane(origin=(0, -11, 0), x_dir=(1, 0, 0), z_dir=(0, 1, 0)).offset(CUT_EXTRUDE18_START)):
        with Locations((-18.357142857, -5.913015285)):
            Rectangle(SKETCH28_W, SKETCH28_H)
    extrude(amount=CUT_EXTRUDE18_DEPTH, mode=Mode.SUBTRACT)


solid = part.part
